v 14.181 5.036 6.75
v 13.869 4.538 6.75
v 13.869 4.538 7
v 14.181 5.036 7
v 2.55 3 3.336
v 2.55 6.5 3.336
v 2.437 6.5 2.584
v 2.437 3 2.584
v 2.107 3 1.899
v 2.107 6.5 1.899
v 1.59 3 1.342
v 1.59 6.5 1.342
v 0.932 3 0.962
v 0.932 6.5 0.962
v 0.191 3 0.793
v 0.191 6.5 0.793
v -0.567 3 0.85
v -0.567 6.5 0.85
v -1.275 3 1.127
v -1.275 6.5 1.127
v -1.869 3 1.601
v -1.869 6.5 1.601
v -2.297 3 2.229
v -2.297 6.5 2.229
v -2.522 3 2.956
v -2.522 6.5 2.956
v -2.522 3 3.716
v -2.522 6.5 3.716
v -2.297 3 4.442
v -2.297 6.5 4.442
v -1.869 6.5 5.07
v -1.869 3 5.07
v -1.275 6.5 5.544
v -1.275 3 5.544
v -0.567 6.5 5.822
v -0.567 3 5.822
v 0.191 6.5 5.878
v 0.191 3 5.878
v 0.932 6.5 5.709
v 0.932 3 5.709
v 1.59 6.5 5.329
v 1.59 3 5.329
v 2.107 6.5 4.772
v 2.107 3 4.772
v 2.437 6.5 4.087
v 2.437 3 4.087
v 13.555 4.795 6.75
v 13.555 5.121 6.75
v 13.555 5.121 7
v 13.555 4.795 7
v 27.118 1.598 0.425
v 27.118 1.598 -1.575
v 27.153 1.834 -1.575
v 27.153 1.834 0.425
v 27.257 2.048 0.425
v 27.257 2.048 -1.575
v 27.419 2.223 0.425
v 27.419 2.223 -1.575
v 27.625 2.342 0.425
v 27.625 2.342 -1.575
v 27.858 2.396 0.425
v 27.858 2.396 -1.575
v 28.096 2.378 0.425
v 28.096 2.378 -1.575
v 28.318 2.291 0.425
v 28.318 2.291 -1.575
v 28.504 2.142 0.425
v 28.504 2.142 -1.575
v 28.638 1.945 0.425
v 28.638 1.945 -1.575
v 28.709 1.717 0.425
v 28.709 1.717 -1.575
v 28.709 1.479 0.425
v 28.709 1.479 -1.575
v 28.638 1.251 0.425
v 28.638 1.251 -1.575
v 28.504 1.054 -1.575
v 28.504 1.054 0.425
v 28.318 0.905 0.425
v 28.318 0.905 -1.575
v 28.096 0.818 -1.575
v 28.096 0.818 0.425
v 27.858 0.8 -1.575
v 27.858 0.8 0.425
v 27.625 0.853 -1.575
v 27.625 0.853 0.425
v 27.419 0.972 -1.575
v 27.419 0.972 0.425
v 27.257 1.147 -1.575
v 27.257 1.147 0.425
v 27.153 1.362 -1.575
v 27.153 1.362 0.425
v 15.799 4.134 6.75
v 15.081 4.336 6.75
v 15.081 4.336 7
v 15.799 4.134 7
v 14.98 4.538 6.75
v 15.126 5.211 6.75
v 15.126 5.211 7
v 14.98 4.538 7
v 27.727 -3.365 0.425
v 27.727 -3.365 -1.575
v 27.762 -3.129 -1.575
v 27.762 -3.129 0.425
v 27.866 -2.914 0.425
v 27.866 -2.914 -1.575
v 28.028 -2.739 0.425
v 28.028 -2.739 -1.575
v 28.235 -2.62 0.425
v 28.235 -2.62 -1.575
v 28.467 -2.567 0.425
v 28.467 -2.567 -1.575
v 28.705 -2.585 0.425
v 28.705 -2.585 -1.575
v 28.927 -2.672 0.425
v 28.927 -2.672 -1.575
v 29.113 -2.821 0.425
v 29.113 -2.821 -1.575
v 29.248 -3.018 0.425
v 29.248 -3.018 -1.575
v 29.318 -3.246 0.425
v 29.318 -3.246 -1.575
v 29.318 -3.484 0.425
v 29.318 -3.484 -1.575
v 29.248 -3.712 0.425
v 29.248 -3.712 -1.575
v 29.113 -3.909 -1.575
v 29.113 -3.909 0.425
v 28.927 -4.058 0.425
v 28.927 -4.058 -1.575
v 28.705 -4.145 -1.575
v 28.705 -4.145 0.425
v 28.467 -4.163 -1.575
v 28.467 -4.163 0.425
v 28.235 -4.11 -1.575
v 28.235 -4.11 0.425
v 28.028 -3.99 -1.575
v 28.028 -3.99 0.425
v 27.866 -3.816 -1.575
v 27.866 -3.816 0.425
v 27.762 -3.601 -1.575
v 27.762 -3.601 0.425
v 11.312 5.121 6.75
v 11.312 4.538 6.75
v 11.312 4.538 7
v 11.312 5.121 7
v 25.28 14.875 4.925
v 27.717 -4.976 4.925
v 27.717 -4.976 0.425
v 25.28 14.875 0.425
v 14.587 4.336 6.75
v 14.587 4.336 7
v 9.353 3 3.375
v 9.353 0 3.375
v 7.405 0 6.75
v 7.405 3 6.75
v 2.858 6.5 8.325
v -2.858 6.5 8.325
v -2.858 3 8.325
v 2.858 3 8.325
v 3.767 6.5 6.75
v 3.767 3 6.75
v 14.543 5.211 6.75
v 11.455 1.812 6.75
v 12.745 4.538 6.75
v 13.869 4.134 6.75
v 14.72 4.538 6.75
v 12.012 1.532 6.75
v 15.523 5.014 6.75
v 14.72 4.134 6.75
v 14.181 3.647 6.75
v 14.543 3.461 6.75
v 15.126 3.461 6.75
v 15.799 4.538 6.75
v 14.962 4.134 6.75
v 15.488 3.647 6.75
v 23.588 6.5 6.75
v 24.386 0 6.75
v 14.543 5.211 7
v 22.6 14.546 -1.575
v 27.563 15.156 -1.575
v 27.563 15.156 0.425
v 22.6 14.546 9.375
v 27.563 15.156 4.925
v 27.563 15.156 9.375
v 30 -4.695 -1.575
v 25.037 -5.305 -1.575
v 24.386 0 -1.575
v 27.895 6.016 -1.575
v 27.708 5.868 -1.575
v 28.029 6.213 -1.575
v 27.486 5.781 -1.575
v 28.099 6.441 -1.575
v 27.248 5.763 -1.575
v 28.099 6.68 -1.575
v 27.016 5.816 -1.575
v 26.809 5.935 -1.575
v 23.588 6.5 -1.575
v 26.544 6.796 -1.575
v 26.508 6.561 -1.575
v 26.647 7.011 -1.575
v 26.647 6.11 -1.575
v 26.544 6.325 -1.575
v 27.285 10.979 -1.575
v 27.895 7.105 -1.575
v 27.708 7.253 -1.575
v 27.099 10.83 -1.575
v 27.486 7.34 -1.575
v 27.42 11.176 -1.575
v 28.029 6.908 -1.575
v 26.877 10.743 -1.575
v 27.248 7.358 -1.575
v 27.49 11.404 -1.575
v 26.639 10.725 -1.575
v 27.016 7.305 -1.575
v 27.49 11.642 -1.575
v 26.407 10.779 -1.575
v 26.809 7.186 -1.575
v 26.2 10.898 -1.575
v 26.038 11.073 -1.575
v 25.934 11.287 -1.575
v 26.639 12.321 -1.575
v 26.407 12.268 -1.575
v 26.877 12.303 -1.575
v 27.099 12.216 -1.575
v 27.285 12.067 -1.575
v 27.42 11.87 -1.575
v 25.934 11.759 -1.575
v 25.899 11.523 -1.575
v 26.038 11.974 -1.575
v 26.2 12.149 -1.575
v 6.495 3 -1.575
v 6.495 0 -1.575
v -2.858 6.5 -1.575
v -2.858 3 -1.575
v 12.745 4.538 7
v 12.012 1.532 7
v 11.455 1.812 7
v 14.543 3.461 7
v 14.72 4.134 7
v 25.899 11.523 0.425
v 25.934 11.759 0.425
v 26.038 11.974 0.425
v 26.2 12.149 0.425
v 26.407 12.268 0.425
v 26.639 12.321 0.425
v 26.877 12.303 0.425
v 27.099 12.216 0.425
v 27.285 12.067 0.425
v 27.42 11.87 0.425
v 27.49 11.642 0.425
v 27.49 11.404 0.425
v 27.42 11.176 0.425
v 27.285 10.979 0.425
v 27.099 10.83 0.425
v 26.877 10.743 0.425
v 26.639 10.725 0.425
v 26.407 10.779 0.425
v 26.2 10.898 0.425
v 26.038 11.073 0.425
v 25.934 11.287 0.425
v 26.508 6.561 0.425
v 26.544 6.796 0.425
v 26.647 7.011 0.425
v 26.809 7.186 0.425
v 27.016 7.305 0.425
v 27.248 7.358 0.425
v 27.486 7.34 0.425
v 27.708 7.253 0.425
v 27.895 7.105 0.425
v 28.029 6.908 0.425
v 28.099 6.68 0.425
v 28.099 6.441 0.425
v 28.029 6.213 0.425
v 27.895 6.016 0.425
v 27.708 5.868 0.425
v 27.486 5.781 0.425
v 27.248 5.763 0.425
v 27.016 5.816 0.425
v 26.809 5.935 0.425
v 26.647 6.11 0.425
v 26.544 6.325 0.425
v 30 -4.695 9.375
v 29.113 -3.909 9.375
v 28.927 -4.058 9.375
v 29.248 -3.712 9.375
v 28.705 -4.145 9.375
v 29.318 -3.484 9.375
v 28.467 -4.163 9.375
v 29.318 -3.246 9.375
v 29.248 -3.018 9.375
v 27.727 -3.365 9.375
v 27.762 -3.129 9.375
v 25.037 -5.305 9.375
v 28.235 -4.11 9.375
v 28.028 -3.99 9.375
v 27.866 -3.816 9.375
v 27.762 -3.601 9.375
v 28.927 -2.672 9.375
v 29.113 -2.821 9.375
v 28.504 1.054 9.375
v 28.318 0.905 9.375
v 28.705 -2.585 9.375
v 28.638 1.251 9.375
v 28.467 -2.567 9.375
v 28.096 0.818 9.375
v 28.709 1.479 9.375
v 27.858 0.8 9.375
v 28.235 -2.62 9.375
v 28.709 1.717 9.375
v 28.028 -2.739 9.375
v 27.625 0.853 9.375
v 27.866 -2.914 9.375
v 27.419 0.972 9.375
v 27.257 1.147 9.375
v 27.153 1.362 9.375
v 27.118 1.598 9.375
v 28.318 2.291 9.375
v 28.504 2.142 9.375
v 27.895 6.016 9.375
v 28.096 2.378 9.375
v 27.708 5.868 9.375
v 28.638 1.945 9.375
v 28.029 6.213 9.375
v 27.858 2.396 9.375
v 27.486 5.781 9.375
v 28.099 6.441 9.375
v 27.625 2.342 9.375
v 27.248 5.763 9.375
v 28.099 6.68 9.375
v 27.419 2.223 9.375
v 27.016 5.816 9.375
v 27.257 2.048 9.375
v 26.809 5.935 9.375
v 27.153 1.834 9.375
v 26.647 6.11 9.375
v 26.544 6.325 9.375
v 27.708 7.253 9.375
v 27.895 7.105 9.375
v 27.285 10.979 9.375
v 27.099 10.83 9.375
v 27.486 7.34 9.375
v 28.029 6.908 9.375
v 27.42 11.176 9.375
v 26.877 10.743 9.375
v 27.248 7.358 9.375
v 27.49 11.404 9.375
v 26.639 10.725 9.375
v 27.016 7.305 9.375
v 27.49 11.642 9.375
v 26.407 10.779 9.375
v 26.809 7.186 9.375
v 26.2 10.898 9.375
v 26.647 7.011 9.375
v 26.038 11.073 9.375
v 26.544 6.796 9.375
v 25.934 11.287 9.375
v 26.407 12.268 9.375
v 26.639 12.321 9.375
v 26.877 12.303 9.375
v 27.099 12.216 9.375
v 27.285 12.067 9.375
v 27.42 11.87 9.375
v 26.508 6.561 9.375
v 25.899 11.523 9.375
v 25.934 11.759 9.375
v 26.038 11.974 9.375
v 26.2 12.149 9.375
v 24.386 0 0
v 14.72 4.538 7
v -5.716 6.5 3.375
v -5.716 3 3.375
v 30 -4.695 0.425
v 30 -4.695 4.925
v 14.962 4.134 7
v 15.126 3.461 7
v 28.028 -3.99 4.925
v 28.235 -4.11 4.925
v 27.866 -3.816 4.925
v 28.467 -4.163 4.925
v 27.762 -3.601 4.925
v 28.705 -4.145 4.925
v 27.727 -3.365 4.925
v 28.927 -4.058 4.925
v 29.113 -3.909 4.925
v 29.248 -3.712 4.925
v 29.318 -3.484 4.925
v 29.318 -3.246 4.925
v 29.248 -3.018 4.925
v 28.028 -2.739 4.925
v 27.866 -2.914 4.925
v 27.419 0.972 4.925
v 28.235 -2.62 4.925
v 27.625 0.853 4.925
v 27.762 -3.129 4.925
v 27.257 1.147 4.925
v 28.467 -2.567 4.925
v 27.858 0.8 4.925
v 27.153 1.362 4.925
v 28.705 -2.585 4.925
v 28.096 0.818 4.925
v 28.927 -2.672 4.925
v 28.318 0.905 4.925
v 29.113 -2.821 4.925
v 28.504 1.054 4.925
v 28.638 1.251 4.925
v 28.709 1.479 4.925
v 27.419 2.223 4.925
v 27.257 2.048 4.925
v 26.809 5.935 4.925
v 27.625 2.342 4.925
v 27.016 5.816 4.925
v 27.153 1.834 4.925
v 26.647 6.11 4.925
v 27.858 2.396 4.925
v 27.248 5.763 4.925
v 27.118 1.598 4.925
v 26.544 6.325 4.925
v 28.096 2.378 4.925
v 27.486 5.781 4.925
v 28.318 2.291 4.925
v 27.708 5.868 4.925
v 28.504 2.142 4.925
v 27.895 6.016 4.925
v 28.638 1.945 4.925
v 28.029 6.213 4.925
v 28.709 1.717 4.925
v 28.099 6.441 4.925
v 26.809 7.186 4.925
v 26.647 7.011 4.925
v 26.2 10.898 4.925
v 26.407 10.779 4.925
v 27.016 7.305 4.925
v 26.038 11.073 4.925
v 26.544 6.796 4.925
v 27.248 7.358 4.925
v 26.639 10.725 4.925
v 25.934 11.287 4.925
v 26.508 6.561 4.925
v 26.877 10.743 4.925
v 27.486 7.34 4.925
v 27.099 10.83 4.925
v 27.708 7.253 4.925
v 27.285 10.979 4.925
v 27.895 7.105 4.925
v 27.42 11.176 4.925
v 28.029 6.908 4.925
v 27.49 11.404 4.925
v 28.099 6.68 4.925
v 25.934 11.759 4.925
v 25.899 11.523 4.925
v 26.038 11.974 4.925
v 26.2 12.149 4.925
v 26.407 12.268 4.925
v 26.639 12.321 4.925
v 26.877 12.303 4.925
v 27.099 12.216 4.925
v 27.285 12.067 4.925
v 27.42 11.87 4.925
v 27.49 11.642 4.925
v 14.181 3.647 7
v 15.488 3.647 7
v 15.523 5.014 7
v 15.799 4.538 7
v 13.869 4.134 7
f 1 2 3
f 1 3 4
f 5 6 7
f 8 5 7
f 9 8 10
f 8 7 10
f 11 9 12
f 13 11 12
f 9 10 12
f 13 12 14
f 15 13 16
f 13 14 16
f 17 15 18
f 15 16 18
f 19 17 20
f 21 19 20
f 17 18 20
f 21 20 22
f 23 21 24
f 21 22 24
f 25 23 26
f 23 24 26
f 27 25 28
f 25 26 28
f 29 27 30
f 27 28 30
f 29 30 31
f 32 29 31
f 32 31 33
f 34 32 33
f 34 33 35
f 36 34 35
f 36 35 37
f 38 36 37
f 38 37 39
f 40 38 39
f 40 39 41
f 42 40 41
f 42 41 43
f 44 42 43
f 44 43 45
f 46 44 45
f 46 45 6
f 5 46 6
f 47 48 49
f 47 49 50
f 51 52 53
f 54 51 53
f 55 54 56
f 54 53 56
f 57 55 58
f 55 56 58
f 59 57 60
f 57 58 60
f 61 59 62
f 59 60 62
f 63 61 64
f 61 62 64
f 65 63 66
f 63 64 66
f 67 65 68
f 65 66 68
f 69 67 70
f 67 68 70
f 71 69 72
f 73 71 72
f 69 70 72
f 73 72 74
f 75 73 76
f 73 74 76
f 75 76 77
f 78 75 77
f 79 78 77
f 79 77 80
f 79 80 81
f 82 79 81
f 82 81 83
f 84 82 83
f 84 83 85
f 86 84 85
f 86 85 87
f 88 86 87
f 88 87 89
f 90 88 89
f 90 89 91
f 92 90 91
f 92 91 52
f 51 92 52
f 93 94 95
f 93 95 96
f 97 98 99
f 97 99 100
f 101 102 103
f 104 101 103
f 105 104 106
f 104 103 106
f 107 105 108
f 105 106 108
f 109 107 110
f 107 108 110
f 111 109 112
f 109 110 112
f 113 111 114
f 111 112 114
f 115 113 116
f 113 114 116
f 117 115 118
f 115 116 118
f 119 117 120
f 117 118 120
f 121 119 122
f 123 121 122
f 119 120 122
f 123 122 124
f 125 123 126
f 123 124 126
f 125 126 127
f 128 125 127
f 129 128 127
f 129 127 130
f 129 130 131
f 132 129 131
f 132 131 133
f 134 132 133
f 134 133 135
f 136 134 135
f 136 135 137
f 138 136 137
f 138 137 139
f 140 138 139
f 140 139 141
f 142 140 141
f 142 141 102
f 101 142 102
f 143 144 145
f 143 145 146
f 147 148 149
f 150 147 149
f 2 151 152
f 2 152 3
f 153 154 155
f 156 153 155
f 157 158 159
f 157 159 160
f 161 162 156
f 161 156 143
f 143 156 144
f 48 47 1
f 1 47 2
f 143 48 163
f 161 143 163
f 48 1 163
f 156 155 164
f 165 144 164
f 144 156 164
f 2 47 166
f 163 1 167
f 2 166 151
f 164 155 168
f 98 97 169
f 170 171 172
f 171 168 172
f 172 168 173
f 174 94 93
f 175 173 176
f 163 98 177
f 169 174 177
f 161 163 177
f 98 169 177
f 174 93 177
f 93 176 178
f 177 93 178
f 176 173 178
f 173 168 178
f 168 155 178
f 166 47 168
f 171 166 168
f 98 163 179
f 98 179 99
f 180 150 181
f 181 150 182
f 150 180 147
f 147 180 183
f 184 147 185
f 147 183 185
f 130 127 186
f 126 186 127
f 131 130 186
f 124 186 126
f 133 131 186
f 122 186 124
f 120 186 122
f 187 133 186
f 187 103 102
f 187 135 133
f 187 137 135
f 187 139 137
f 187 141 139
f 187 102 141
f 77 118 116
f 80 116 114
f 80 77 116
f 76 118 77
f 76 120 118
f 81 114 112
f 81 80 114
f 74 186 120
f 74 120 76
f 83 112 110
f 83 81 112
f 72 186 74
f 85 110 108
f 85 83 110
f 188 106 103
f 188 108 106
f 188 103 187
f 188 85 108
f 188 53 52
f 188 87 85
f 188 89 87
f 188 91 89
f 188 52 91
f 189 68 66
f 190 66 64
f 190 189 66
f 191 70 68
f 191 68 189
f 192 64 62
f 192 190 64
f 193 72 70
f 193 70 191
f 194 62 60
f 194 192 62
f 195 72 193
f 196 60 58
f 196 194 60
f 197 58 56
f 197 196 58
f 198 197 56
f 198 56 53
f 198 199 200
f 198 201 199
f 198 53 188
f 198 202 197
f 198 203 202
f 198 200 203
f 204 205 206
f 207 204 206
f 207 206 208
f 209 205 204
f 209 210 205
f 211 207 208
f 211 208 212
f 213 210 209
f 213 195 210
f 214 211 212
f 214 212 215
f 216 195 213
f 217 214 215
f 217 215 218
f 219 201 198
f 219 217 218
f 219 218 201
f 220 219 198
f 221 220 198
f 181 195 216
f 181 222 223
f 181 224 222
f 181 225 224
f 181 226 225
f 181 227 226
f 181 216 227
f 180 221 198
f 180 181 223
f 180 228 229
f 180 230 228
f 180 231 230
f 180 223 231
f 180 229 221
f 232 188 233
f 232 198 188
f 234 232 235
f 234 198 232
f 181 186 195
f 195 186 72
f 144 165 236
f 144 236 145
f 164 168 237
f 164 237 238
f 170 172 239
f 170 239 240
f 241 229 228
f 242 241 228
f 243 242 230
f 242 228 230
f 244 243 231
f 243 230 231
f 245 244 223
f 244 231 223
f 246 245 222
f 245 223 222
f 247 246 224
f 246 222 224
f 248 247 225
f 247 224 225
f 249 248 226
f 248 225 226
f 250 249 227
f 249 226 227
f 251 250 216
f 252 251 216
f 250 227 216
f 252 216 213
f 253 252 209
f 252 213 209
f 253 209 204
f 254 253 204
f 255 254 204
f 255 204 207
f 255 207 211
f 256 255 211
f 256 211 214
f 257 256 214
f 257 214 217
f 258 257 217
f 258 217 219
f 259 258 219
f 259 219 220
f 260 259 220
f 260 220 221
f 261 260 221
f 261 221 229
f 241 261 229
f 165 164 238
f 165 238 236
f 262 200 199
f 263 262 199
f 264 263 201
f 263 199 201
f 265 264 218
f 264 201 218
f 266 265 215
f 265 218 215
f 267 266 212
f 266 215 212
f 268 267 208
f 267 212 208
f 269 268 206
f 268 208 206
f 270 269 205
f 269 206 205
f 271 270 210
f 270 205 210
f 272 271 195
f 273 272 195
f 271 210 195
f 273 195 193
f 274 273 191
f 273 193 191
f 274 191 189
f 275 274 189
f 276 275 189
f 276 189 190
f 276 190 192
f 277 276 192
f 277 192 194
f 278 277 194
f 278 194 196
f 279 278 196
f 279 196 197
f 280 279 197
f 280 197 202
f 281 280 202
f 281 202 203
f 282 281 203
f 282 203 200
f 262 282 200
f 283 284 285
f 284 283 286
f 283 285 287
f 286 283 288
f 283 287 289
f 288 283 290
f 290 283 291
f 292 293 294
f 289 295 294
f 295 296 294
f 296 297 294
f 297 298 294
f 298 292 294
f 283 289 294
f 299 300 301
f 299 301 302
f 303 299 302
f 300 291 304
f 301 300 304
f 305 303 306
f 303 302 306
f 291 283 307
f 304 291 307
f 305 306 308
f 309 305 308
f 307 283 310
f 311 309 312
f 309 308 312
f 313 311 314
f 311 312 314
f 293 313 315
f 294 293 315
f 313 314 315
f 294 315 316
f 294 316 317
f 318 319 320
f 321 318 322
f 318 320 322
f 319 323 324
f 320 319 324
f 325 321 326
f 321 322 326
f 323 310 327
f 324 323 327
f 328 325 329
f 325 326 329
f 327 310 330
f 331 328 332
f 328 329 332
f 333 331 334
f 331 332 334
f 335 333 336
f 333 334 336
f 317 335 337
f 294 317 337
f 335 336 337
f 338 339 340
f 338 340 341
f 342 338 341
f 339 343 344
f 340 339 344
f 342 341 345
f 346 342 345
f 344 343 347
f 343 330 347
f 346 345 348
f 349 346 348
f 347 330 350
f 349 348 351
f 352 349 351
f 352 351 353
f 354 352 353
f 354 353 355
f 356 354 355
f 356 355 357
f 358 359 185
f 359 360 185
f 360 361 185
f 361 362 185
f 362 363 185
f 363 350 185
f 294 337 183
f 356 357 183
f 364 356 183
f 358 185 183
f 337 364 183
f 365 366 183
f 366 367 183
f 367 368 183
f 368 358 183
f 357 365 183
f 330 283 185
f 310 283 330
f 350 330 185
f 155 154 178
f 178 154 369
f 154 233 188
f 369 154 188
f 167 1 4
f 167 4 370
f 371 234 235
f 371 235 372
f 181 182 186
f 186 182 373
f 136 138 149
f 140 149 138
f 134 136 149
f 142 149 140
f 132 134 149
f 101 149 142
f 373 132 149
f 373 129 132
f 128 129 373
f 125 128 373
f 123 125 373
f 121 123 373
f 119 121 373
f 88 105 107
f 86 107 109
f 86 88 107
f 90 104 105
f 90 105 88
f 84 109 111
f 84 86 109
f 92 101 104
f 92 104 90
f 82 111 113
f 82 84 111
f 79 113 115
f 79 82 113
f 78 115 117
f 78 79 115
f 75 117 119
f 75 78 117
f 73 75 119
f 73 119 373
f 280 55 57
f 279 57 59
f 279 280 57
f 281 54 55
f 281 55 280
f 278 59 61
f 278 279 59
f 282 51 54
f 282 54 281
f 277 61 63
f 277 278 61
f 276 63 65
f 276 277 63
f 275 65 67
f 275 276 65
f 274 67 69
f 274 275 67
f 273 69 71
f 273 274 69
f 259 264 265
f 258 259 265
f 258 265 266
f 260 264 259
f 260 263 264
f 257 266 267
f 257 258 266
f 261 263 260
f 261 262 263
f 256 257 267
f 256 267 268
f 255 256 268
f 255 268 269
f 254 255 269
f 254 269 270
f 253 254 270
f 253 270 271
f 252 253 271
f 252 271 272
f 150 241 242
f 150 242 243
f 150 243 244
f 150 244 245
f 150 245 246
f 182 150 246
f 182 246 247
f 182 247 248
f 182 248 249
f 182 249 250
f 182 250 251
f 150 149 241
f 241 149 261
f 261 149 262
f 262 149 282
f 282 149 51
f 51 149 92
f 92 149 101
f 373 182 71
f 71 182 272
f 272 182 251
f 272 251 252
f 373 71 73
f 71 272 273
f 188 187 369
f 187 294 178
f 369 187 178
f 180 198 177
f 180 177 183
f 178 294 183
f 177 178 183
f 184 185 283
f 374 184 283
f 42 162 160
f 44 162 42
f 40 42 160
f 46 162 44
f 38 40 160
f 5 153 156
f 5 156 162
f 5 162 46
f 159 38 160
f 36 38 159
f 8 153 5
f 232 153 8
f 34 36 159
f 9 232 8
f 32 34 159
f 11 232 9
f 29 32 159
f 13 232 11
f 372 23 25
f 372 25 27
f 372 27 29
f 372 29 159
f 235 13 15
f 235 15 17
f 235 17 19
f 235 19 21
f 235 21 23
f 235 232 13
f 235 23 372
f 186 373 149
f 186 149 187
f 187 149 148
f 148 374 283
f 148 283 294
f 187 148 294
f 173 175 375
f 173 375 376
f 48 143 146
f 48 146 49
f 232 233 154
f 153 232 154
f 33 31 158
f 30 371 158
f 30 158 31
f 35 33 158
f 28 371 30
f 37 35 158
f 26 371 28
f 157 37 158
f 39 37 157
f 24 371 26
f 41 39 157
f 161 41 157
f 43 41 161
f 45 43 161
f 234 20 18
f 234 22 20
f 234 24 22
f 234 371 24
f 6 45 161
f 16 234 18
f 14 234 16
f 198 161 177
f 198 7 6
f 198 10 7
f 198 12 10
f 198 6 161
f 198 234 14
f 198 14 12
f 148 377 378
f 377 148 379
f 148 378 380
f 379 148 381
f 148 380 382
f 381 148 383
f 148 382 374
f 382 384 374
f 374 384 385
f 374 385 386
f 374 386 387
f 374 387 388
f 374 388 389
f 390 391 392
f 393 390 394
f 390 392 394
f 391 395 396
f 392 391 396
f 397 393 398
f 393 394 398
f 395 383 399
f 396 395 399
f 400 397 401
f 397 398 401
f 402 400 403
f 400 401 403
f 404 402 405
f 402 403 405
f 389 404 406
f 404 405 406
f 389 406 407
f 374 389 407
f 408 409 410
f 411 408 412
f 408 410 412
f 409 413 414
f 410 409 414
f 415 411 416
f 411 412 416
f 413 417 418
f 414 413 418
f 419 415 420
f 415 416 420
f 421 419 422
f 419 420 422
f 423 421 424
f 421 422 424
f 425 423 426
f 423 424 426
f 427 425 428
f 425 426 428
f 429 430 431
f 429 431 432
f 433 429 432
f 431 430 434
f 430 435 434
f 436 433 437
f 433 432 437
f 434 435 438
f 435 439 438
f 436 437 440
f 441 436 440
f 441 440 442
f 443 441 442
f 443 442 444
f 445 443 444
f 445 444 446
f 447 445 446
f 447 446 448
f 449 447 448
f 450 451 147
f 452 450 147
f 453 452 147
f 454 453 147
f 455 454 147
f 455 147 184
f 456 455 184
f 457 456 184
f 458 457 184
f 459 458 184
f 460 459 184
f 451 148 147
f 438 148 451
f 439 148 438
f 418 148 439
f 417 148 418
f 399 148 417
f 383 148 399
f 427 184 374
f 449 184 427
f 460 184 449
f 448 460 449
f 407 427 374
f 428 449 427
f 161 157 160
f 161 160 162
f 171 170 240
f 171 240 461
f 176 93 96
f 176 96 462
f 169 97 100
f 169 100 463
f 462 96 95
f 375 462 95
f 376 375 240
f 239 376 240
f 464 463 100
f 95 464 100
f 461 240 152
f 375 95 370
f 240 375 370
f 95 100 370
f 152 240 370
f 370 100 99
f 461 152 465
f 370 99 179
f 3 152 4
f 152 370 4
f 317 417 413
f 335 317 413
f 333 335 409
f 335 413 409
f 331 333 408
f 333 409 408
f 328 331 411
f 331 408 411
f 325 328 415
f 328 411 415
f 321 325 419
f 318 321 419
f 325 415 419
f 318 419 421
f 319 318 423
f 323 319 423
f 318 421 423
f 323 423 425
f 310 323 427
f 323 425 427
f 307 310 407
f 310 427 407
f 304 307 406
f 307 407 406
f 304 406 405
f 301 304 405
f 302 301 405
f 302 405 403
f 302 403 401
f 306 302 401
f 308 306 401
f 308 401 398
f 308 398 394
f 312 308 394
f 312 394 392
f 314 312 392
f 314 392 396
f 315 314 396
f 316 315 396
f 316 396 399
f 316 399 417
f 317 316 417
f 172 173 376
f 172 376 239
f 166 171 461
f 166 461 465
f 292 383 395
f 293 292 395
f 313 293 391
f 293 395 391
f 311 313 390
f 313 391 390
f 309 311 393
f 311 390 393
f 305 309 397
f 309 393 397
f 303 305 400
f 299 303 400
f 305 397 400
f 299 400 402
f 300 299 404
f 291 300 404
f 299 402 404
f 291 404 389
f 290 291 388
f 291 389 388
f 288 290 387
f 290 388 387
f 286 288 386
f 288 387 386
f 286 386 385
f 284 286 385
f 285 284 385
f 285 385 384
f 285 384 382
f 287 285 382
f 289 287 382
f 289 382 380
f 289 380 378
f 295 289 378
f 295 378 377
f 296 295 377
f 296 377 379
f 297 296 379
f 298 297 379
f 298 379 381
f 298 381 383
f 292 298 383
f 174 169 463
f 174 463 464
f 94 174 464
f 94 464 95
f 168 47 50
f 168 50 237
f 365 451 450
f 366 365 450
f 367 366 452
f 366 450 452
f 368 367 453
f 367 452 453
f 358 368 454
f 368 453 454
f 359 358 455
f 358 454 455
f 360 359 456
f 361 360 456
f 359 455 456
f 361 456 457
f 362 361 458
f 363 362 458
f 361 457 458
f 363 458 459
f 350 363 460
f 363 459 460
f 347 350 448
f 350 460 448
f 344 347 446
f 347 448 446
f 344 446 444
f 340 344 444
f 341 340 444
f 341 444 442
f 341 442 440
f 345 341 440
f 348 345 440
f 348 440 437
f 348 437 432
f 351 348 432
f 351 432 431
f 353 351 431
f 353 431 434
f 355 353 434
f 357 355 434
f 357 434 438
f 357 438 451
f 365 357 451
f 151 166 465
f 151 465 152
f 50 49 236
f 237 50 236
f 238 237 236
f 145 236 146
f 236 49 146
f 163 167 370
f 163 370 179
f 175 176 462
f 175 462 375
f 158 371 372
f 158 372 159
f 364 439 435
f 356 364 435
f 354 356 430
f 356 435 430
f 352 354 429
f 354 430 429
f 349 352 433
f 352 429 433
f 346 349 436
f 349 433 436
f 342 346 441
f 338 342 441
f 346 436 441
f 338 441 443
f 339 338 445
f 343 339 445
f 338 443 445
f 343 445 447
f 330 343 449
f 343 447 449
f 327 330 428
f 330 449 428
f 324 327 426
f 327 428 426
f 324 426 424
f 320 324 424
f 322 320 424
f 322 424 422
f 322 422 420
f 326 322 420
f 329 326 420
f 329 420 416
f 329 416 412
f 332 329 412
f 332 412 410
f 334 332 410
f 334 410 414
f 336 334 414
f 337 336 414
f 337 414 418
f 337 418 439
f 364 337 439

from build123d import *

# Parameters (mm, degrees)
SKETCH1_W                = 25
SKETCH1_H                = 6.75
BOSS_EXTRUDE1_DEPTH      = 6.5
BOSS_EXTRUDE4_DEPTH      = 6.5
BOSS_EXTRUDE3_DEPTH      = 6
BOSS_EXTRUDE3_DEPTH_BACK = 4.95
SKETCH4_W                = 2.3
SKETCH4_H                = 4.5
CUT_EXTRUDE1_DEPTH       = 23
SKETCH6_R                = 2.55
CUT_EXTRUDE2_DEPTH       = 10
BOSS_EXTRUDE5_DEPTH      = 1.575
CUT_EXTRUDE3_DEPTH       = 3
SKETCH9_R                = 0.8
CUT_EXTRUDE4_DEPTH       = 10.95
BOSS_EXTRUDE6_DEPTH      = 0.25


with BuildPart() as part:
    # Sketch1 → Boss-Extrude1 (new body)
    with BuildSketch(Plane(origin=(0, 0, 0), x_dir=(1, 0, 0), z_dir=(0, 1, 0))):
        with Locations((12.5, -3.375)):
            Rectangle(SKETCH1_W, SKETCH1_H)
    extrude(amount=BOSS_EXTRUDE1_DEPTH)

    # Sketch5 → Boss-Extrude4 (add)
    with BuildSketch(Plane(origin=(0, 6.5, 0), x_dir=(1, 0, 0), z_dir=(0, 1, 0))):
        Polygon((-5.715767665, -3.375), (-2.857883832, -8.325), (2.857883832, -8.325), (5.715767665, -3.375), (2.857883832, 1.575), (-2.857883832, 1.575), align=None)
    extrude(amount=-BOSS_EXTRUDE4_DEPTH)

    # Sketch3 → Boss-Extrude3 (add, two sides)
    with BuildSketch(Plane.XY.offset(3.375)) as boss_extrude3_sk:
        Polygon((22.599882374, 14.546249674), (27.562613132, 15.155596391), (30, -4.695326641), (25.037269242, -5.304673359), align=None)
    extrude(amount=BOSS_EXTRUDE3_DEPTH)
    extrude(boss_extrude3_sk.sketch, amount=-BOSS_EXTRUDE3_DEPTH_BACK)

    # Sketch4 → Cut-Extrude1 (cut)
    with BuildSketch(Plane(origin=(-1.423871601, 11.596503591, 0), x_dir=(0.992546152, 0.121869343, 0), z_dir=(-0.121869343, 0.992546152, 0))):
        with Locations((28.054168174, -2.675)):
            Rectangle(SKETCH4_W, SKETCH4_H)
    extrude(amount=-CUT_EXTRUDE1_DEPTH, mode=Mode.SUBTRACT)

    # Sketch6 → Cut-Extrude2 (cut)
    with BuildSketch(Plane(origin=(0, 6.5, 0), x_dir=(1, 0, 0), z_dir=(0, 1, 0))):
        with Locations((0, -3.335615973)):
            Circle(SKETCH6_R)
    extrude(amount=-CUT_EXTRUDE2_DEPTH, mode=Mode.SUBTRACT)

    # Sketch7 → Boss-Extrude5 (add)
    with BuildSketch(Plane(origin=(0, 0, -1.575), x_dir=(-1, 0, 0), z_dir=(0, 0, -1))):
        Polygon((-2.857883832, 0), (-24.385937253, 0), (-25.037269242, -5.304673359), (-30, -4.695326641), (-27.562613132, 15.155596391), (-22.599882374, 14.546249674), (-23.587837607, 6.5), (-2.857883832, 6.5), align=None)
    extrude(amount=-BOSS_EXTRUDE5_DEPTH)

    # Sketch8 → Cut-Extrude3 (cut)
    with BuildSketch(Plane(origin=(0, 0, 0), x_dir=(-1, 0, 0), z_dir=(0, -1, 0))):
        Polygon((-4.67653718, -11.475), (4.67653718, -11.475), (9.353074361, -3.375), (4.67653718, 4.725), (-4.67653718, 4.725), (-9.353074361, -3.375), align=None)
    extrude(amount=-CUT_EXTRUDE3_DEPTH, mode=Mode.SUBTRACT)

    # Sketch9 → Cut-Extrude4 (cut)
    with BuildSketch(Plane(origin=(0, 0, -1.575), x_dir=(-1, 0, 0), z_dir=(0, 0, -1))):
        with Locations((-28.526885988, -3.36493756)):
            Circle(SKETCH9_R)
        with Locations((-27.917539271, 1.597793198)):
            Circle(SKETCH9_R)
        with Locations((-27.308192554, 6.560523956)):
            Circle(SKETCH9_R)
        with Locations((-26.698845837, 11.523254714)):
            Circle(SKETCH9_R)
    extrude(amount=-CUT_EXTRUDE4_DEPTH, mode=Mode.SUBTRACT)

    # Sketch10 → Boss-Extrude6 (add)
    with BuildSketch(Plane.XY.offset(6.75)):
        Polygon((11.311801843, 5.121255448), (13.555391587, 5.121255448), (13.555391587, 4.795233814), (12.011521395, 1.531511859), (11.454830689, 1.811960577), (12.744894792, 4.537922115), (11.311801843, 4.537922115), align=None)
        Polygon((14.542571074, 5.210999038), (15.125904407, 5.210999038), (14.980071074, 4.537922115), (15.523440465, 5.013983814), (15.798981331, 4.537922115), (15.081032613, 4.335999038), (15.798981331, 4.134075961), (15.488384375, 3.647497435), (14.961841907, 4.134075961), (15.125904407, 3.460999038), (14.542571074, 3.460999038), (14.719954888, 4.134075961), (14.18149335, 3.647497435), (13.869494151, 4.134075961), (14.587442869, 4.335999038), (13.869494151, 4.537922115), (14.18149335, 5.036419711), (14.719954888, 4.537922115), align=None)
    extrude(amount=BOSS_EXTRUDE6_DEPTH)


solid = part.part
